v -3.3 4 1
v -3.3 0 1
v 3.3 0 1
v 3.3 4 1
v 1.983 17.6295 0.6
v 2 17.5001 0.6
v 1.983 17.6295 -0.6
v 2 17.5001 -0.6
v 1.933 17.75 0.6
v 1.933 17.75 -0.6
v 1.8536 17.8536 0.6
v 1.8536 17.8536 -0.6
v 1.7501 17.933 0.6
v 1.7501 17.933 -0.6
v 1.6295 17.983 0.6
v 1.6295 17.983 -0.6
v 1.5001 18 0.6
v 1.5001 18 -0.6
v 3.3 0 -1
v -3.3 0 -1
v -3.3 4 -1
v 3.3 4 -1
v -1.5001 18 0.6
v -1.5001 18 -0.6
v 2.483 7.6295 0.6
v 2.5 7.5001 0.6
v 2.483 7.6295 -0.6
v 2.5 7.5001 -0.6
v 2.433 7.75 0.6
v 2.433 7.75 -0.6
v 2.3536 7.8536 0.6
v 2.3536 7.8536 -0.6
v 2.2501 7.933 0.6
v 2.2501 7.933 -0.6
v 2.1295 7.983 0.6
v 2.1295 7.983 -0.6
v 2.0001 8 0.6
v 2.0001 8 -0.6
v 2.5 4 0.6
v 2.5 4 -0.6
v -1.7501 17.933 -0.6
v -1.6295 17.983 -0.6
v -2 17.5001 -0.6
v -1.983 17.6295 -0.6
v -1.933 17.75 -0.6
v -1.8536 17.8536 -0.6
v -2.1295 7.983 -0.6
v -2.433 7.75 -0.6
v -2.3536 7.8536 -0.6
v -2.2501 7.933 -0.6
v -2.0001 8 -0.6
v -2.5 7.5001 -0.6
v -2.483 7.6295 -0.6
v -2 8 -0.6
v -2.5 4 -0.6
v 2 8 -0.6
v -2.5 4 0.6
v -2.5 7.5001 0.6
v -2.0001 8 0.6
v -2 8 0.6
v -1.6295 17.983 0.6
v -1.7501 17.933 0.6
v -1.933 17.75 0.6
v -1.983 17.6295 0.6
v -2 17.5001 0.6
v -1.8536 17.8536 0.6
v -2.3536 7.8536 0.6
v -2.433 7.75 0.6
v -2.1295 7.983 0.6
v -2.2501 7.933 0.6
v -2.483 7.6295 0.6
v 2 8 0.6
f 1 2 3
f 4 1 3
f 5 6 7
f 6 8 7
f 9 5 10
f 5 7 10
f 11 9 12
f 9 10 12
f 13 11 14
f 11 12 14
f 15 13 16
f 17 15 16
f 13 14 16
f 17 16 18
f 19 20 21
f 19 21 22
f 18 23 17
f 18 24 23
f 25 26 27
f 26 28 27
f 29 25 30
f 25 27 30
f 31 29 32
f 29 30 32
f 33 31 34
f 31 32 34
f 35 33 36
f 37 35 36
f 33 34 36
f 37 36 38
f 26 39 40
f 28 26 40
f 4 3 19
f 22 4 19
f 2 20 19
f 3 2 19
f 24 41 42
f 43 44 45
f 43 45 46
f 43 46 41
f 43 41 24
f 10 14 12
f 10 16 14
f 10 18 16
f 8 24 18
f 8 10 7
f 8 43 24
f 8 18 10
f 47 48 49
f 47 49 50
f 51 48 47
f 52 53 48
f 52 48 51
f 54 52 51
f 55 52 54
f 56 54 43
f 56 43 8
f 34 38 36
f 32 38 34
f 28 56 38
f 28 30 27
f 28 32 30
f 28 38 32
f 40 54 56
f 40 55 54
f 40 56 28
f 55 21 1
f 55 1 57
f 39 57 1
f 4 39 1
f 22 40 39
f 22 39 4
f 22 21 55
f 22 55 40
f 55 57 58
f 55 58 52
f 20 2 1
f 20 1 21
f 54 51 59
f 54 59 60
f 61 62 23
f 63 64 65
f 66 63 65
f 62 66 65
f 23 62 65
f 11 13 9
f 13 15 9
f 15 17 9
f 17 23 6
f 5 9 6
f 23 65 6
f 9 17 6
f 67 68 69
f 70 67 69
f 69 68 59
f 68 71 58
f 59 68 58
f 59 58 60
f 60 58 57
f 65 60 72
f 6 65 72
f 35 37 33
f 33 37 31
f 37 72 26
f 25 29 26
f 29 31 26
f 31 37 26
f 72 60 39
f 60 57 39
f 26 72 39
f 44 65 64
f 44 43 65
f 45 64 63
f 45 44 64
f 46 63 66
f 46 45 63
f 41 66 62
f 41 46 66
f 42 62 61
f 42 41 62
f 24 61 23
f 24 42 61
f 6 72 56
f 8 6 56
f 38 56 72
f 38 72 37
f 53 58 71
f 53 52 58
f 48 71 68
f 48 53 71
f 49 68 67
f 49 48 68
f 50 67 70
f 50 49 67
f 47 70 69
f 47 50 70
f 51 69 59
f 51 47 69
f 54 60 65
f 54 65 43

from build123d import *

# Parameters (mm, degrees)
SKETCH2_W           = 6.6
SKETCH2_H           = 2
BOSS_EXTRUDE1_DEPTH = 4
SKETCH3_W           = 5
SKETCH3_H           = 1.2
BOSS_EXTRUDE2_DEPTH = 4
SKETCH4_W           = 4
SKETCH4_H           = 1.2
BOSS_EXTRUDE3_DEPTH = 10
FILLET3_R           = 0.5


with BuildPart() as part:
    # Sketch2 → Boss-Extrude1 (new body)
    with BuildSketch(Plane(origin=(0, 0, 0), x_dir=(1, 0, 0), z_dir=(0, 1, 0))):
        Rectangle(SKETCH2_W, SKETCH2_H)
    extrude(amount=BOSS_EXTRUDE1_DEPTH)

    # Sketch3 → Boss-Extrude2 (add)
    with BuildSketch(Plane(origin=(0, 4, 0), x_dir=(1, 0, 0), z_dir=(0, 1, 0))):
        Rectangle(SKETCH3_W, SKETCH3_H)
    extrude(amount=BOSS_EXTRUDE2_DEPTH)

    # Sketch4 → Boss-Extrude3 (add)
    with BuildSketch(Plane(origin=(0, 8, 0), x_dir=(1, 0, 0), z_dir=(0, 1, 0))):
        Rectangle(SKETCH4_W, SKETCH4_H)
    extrude(amount=BOSS_EXTRUDE3_DEPTH)

    # Fillet3
    fillet3_edges = [part.edges().sort_by_distance(p)[0] for p in [
        (2.5, 8, 0),
        (-2.5, 8, 0),
        (2, 18, 0),
        (-2, 18, 0),
    ]]
    fillet(fillet3_edges, radius=FILLET3_R - 0.0001)  # a hair under: the kernel refuses the full size


solid = part.part
